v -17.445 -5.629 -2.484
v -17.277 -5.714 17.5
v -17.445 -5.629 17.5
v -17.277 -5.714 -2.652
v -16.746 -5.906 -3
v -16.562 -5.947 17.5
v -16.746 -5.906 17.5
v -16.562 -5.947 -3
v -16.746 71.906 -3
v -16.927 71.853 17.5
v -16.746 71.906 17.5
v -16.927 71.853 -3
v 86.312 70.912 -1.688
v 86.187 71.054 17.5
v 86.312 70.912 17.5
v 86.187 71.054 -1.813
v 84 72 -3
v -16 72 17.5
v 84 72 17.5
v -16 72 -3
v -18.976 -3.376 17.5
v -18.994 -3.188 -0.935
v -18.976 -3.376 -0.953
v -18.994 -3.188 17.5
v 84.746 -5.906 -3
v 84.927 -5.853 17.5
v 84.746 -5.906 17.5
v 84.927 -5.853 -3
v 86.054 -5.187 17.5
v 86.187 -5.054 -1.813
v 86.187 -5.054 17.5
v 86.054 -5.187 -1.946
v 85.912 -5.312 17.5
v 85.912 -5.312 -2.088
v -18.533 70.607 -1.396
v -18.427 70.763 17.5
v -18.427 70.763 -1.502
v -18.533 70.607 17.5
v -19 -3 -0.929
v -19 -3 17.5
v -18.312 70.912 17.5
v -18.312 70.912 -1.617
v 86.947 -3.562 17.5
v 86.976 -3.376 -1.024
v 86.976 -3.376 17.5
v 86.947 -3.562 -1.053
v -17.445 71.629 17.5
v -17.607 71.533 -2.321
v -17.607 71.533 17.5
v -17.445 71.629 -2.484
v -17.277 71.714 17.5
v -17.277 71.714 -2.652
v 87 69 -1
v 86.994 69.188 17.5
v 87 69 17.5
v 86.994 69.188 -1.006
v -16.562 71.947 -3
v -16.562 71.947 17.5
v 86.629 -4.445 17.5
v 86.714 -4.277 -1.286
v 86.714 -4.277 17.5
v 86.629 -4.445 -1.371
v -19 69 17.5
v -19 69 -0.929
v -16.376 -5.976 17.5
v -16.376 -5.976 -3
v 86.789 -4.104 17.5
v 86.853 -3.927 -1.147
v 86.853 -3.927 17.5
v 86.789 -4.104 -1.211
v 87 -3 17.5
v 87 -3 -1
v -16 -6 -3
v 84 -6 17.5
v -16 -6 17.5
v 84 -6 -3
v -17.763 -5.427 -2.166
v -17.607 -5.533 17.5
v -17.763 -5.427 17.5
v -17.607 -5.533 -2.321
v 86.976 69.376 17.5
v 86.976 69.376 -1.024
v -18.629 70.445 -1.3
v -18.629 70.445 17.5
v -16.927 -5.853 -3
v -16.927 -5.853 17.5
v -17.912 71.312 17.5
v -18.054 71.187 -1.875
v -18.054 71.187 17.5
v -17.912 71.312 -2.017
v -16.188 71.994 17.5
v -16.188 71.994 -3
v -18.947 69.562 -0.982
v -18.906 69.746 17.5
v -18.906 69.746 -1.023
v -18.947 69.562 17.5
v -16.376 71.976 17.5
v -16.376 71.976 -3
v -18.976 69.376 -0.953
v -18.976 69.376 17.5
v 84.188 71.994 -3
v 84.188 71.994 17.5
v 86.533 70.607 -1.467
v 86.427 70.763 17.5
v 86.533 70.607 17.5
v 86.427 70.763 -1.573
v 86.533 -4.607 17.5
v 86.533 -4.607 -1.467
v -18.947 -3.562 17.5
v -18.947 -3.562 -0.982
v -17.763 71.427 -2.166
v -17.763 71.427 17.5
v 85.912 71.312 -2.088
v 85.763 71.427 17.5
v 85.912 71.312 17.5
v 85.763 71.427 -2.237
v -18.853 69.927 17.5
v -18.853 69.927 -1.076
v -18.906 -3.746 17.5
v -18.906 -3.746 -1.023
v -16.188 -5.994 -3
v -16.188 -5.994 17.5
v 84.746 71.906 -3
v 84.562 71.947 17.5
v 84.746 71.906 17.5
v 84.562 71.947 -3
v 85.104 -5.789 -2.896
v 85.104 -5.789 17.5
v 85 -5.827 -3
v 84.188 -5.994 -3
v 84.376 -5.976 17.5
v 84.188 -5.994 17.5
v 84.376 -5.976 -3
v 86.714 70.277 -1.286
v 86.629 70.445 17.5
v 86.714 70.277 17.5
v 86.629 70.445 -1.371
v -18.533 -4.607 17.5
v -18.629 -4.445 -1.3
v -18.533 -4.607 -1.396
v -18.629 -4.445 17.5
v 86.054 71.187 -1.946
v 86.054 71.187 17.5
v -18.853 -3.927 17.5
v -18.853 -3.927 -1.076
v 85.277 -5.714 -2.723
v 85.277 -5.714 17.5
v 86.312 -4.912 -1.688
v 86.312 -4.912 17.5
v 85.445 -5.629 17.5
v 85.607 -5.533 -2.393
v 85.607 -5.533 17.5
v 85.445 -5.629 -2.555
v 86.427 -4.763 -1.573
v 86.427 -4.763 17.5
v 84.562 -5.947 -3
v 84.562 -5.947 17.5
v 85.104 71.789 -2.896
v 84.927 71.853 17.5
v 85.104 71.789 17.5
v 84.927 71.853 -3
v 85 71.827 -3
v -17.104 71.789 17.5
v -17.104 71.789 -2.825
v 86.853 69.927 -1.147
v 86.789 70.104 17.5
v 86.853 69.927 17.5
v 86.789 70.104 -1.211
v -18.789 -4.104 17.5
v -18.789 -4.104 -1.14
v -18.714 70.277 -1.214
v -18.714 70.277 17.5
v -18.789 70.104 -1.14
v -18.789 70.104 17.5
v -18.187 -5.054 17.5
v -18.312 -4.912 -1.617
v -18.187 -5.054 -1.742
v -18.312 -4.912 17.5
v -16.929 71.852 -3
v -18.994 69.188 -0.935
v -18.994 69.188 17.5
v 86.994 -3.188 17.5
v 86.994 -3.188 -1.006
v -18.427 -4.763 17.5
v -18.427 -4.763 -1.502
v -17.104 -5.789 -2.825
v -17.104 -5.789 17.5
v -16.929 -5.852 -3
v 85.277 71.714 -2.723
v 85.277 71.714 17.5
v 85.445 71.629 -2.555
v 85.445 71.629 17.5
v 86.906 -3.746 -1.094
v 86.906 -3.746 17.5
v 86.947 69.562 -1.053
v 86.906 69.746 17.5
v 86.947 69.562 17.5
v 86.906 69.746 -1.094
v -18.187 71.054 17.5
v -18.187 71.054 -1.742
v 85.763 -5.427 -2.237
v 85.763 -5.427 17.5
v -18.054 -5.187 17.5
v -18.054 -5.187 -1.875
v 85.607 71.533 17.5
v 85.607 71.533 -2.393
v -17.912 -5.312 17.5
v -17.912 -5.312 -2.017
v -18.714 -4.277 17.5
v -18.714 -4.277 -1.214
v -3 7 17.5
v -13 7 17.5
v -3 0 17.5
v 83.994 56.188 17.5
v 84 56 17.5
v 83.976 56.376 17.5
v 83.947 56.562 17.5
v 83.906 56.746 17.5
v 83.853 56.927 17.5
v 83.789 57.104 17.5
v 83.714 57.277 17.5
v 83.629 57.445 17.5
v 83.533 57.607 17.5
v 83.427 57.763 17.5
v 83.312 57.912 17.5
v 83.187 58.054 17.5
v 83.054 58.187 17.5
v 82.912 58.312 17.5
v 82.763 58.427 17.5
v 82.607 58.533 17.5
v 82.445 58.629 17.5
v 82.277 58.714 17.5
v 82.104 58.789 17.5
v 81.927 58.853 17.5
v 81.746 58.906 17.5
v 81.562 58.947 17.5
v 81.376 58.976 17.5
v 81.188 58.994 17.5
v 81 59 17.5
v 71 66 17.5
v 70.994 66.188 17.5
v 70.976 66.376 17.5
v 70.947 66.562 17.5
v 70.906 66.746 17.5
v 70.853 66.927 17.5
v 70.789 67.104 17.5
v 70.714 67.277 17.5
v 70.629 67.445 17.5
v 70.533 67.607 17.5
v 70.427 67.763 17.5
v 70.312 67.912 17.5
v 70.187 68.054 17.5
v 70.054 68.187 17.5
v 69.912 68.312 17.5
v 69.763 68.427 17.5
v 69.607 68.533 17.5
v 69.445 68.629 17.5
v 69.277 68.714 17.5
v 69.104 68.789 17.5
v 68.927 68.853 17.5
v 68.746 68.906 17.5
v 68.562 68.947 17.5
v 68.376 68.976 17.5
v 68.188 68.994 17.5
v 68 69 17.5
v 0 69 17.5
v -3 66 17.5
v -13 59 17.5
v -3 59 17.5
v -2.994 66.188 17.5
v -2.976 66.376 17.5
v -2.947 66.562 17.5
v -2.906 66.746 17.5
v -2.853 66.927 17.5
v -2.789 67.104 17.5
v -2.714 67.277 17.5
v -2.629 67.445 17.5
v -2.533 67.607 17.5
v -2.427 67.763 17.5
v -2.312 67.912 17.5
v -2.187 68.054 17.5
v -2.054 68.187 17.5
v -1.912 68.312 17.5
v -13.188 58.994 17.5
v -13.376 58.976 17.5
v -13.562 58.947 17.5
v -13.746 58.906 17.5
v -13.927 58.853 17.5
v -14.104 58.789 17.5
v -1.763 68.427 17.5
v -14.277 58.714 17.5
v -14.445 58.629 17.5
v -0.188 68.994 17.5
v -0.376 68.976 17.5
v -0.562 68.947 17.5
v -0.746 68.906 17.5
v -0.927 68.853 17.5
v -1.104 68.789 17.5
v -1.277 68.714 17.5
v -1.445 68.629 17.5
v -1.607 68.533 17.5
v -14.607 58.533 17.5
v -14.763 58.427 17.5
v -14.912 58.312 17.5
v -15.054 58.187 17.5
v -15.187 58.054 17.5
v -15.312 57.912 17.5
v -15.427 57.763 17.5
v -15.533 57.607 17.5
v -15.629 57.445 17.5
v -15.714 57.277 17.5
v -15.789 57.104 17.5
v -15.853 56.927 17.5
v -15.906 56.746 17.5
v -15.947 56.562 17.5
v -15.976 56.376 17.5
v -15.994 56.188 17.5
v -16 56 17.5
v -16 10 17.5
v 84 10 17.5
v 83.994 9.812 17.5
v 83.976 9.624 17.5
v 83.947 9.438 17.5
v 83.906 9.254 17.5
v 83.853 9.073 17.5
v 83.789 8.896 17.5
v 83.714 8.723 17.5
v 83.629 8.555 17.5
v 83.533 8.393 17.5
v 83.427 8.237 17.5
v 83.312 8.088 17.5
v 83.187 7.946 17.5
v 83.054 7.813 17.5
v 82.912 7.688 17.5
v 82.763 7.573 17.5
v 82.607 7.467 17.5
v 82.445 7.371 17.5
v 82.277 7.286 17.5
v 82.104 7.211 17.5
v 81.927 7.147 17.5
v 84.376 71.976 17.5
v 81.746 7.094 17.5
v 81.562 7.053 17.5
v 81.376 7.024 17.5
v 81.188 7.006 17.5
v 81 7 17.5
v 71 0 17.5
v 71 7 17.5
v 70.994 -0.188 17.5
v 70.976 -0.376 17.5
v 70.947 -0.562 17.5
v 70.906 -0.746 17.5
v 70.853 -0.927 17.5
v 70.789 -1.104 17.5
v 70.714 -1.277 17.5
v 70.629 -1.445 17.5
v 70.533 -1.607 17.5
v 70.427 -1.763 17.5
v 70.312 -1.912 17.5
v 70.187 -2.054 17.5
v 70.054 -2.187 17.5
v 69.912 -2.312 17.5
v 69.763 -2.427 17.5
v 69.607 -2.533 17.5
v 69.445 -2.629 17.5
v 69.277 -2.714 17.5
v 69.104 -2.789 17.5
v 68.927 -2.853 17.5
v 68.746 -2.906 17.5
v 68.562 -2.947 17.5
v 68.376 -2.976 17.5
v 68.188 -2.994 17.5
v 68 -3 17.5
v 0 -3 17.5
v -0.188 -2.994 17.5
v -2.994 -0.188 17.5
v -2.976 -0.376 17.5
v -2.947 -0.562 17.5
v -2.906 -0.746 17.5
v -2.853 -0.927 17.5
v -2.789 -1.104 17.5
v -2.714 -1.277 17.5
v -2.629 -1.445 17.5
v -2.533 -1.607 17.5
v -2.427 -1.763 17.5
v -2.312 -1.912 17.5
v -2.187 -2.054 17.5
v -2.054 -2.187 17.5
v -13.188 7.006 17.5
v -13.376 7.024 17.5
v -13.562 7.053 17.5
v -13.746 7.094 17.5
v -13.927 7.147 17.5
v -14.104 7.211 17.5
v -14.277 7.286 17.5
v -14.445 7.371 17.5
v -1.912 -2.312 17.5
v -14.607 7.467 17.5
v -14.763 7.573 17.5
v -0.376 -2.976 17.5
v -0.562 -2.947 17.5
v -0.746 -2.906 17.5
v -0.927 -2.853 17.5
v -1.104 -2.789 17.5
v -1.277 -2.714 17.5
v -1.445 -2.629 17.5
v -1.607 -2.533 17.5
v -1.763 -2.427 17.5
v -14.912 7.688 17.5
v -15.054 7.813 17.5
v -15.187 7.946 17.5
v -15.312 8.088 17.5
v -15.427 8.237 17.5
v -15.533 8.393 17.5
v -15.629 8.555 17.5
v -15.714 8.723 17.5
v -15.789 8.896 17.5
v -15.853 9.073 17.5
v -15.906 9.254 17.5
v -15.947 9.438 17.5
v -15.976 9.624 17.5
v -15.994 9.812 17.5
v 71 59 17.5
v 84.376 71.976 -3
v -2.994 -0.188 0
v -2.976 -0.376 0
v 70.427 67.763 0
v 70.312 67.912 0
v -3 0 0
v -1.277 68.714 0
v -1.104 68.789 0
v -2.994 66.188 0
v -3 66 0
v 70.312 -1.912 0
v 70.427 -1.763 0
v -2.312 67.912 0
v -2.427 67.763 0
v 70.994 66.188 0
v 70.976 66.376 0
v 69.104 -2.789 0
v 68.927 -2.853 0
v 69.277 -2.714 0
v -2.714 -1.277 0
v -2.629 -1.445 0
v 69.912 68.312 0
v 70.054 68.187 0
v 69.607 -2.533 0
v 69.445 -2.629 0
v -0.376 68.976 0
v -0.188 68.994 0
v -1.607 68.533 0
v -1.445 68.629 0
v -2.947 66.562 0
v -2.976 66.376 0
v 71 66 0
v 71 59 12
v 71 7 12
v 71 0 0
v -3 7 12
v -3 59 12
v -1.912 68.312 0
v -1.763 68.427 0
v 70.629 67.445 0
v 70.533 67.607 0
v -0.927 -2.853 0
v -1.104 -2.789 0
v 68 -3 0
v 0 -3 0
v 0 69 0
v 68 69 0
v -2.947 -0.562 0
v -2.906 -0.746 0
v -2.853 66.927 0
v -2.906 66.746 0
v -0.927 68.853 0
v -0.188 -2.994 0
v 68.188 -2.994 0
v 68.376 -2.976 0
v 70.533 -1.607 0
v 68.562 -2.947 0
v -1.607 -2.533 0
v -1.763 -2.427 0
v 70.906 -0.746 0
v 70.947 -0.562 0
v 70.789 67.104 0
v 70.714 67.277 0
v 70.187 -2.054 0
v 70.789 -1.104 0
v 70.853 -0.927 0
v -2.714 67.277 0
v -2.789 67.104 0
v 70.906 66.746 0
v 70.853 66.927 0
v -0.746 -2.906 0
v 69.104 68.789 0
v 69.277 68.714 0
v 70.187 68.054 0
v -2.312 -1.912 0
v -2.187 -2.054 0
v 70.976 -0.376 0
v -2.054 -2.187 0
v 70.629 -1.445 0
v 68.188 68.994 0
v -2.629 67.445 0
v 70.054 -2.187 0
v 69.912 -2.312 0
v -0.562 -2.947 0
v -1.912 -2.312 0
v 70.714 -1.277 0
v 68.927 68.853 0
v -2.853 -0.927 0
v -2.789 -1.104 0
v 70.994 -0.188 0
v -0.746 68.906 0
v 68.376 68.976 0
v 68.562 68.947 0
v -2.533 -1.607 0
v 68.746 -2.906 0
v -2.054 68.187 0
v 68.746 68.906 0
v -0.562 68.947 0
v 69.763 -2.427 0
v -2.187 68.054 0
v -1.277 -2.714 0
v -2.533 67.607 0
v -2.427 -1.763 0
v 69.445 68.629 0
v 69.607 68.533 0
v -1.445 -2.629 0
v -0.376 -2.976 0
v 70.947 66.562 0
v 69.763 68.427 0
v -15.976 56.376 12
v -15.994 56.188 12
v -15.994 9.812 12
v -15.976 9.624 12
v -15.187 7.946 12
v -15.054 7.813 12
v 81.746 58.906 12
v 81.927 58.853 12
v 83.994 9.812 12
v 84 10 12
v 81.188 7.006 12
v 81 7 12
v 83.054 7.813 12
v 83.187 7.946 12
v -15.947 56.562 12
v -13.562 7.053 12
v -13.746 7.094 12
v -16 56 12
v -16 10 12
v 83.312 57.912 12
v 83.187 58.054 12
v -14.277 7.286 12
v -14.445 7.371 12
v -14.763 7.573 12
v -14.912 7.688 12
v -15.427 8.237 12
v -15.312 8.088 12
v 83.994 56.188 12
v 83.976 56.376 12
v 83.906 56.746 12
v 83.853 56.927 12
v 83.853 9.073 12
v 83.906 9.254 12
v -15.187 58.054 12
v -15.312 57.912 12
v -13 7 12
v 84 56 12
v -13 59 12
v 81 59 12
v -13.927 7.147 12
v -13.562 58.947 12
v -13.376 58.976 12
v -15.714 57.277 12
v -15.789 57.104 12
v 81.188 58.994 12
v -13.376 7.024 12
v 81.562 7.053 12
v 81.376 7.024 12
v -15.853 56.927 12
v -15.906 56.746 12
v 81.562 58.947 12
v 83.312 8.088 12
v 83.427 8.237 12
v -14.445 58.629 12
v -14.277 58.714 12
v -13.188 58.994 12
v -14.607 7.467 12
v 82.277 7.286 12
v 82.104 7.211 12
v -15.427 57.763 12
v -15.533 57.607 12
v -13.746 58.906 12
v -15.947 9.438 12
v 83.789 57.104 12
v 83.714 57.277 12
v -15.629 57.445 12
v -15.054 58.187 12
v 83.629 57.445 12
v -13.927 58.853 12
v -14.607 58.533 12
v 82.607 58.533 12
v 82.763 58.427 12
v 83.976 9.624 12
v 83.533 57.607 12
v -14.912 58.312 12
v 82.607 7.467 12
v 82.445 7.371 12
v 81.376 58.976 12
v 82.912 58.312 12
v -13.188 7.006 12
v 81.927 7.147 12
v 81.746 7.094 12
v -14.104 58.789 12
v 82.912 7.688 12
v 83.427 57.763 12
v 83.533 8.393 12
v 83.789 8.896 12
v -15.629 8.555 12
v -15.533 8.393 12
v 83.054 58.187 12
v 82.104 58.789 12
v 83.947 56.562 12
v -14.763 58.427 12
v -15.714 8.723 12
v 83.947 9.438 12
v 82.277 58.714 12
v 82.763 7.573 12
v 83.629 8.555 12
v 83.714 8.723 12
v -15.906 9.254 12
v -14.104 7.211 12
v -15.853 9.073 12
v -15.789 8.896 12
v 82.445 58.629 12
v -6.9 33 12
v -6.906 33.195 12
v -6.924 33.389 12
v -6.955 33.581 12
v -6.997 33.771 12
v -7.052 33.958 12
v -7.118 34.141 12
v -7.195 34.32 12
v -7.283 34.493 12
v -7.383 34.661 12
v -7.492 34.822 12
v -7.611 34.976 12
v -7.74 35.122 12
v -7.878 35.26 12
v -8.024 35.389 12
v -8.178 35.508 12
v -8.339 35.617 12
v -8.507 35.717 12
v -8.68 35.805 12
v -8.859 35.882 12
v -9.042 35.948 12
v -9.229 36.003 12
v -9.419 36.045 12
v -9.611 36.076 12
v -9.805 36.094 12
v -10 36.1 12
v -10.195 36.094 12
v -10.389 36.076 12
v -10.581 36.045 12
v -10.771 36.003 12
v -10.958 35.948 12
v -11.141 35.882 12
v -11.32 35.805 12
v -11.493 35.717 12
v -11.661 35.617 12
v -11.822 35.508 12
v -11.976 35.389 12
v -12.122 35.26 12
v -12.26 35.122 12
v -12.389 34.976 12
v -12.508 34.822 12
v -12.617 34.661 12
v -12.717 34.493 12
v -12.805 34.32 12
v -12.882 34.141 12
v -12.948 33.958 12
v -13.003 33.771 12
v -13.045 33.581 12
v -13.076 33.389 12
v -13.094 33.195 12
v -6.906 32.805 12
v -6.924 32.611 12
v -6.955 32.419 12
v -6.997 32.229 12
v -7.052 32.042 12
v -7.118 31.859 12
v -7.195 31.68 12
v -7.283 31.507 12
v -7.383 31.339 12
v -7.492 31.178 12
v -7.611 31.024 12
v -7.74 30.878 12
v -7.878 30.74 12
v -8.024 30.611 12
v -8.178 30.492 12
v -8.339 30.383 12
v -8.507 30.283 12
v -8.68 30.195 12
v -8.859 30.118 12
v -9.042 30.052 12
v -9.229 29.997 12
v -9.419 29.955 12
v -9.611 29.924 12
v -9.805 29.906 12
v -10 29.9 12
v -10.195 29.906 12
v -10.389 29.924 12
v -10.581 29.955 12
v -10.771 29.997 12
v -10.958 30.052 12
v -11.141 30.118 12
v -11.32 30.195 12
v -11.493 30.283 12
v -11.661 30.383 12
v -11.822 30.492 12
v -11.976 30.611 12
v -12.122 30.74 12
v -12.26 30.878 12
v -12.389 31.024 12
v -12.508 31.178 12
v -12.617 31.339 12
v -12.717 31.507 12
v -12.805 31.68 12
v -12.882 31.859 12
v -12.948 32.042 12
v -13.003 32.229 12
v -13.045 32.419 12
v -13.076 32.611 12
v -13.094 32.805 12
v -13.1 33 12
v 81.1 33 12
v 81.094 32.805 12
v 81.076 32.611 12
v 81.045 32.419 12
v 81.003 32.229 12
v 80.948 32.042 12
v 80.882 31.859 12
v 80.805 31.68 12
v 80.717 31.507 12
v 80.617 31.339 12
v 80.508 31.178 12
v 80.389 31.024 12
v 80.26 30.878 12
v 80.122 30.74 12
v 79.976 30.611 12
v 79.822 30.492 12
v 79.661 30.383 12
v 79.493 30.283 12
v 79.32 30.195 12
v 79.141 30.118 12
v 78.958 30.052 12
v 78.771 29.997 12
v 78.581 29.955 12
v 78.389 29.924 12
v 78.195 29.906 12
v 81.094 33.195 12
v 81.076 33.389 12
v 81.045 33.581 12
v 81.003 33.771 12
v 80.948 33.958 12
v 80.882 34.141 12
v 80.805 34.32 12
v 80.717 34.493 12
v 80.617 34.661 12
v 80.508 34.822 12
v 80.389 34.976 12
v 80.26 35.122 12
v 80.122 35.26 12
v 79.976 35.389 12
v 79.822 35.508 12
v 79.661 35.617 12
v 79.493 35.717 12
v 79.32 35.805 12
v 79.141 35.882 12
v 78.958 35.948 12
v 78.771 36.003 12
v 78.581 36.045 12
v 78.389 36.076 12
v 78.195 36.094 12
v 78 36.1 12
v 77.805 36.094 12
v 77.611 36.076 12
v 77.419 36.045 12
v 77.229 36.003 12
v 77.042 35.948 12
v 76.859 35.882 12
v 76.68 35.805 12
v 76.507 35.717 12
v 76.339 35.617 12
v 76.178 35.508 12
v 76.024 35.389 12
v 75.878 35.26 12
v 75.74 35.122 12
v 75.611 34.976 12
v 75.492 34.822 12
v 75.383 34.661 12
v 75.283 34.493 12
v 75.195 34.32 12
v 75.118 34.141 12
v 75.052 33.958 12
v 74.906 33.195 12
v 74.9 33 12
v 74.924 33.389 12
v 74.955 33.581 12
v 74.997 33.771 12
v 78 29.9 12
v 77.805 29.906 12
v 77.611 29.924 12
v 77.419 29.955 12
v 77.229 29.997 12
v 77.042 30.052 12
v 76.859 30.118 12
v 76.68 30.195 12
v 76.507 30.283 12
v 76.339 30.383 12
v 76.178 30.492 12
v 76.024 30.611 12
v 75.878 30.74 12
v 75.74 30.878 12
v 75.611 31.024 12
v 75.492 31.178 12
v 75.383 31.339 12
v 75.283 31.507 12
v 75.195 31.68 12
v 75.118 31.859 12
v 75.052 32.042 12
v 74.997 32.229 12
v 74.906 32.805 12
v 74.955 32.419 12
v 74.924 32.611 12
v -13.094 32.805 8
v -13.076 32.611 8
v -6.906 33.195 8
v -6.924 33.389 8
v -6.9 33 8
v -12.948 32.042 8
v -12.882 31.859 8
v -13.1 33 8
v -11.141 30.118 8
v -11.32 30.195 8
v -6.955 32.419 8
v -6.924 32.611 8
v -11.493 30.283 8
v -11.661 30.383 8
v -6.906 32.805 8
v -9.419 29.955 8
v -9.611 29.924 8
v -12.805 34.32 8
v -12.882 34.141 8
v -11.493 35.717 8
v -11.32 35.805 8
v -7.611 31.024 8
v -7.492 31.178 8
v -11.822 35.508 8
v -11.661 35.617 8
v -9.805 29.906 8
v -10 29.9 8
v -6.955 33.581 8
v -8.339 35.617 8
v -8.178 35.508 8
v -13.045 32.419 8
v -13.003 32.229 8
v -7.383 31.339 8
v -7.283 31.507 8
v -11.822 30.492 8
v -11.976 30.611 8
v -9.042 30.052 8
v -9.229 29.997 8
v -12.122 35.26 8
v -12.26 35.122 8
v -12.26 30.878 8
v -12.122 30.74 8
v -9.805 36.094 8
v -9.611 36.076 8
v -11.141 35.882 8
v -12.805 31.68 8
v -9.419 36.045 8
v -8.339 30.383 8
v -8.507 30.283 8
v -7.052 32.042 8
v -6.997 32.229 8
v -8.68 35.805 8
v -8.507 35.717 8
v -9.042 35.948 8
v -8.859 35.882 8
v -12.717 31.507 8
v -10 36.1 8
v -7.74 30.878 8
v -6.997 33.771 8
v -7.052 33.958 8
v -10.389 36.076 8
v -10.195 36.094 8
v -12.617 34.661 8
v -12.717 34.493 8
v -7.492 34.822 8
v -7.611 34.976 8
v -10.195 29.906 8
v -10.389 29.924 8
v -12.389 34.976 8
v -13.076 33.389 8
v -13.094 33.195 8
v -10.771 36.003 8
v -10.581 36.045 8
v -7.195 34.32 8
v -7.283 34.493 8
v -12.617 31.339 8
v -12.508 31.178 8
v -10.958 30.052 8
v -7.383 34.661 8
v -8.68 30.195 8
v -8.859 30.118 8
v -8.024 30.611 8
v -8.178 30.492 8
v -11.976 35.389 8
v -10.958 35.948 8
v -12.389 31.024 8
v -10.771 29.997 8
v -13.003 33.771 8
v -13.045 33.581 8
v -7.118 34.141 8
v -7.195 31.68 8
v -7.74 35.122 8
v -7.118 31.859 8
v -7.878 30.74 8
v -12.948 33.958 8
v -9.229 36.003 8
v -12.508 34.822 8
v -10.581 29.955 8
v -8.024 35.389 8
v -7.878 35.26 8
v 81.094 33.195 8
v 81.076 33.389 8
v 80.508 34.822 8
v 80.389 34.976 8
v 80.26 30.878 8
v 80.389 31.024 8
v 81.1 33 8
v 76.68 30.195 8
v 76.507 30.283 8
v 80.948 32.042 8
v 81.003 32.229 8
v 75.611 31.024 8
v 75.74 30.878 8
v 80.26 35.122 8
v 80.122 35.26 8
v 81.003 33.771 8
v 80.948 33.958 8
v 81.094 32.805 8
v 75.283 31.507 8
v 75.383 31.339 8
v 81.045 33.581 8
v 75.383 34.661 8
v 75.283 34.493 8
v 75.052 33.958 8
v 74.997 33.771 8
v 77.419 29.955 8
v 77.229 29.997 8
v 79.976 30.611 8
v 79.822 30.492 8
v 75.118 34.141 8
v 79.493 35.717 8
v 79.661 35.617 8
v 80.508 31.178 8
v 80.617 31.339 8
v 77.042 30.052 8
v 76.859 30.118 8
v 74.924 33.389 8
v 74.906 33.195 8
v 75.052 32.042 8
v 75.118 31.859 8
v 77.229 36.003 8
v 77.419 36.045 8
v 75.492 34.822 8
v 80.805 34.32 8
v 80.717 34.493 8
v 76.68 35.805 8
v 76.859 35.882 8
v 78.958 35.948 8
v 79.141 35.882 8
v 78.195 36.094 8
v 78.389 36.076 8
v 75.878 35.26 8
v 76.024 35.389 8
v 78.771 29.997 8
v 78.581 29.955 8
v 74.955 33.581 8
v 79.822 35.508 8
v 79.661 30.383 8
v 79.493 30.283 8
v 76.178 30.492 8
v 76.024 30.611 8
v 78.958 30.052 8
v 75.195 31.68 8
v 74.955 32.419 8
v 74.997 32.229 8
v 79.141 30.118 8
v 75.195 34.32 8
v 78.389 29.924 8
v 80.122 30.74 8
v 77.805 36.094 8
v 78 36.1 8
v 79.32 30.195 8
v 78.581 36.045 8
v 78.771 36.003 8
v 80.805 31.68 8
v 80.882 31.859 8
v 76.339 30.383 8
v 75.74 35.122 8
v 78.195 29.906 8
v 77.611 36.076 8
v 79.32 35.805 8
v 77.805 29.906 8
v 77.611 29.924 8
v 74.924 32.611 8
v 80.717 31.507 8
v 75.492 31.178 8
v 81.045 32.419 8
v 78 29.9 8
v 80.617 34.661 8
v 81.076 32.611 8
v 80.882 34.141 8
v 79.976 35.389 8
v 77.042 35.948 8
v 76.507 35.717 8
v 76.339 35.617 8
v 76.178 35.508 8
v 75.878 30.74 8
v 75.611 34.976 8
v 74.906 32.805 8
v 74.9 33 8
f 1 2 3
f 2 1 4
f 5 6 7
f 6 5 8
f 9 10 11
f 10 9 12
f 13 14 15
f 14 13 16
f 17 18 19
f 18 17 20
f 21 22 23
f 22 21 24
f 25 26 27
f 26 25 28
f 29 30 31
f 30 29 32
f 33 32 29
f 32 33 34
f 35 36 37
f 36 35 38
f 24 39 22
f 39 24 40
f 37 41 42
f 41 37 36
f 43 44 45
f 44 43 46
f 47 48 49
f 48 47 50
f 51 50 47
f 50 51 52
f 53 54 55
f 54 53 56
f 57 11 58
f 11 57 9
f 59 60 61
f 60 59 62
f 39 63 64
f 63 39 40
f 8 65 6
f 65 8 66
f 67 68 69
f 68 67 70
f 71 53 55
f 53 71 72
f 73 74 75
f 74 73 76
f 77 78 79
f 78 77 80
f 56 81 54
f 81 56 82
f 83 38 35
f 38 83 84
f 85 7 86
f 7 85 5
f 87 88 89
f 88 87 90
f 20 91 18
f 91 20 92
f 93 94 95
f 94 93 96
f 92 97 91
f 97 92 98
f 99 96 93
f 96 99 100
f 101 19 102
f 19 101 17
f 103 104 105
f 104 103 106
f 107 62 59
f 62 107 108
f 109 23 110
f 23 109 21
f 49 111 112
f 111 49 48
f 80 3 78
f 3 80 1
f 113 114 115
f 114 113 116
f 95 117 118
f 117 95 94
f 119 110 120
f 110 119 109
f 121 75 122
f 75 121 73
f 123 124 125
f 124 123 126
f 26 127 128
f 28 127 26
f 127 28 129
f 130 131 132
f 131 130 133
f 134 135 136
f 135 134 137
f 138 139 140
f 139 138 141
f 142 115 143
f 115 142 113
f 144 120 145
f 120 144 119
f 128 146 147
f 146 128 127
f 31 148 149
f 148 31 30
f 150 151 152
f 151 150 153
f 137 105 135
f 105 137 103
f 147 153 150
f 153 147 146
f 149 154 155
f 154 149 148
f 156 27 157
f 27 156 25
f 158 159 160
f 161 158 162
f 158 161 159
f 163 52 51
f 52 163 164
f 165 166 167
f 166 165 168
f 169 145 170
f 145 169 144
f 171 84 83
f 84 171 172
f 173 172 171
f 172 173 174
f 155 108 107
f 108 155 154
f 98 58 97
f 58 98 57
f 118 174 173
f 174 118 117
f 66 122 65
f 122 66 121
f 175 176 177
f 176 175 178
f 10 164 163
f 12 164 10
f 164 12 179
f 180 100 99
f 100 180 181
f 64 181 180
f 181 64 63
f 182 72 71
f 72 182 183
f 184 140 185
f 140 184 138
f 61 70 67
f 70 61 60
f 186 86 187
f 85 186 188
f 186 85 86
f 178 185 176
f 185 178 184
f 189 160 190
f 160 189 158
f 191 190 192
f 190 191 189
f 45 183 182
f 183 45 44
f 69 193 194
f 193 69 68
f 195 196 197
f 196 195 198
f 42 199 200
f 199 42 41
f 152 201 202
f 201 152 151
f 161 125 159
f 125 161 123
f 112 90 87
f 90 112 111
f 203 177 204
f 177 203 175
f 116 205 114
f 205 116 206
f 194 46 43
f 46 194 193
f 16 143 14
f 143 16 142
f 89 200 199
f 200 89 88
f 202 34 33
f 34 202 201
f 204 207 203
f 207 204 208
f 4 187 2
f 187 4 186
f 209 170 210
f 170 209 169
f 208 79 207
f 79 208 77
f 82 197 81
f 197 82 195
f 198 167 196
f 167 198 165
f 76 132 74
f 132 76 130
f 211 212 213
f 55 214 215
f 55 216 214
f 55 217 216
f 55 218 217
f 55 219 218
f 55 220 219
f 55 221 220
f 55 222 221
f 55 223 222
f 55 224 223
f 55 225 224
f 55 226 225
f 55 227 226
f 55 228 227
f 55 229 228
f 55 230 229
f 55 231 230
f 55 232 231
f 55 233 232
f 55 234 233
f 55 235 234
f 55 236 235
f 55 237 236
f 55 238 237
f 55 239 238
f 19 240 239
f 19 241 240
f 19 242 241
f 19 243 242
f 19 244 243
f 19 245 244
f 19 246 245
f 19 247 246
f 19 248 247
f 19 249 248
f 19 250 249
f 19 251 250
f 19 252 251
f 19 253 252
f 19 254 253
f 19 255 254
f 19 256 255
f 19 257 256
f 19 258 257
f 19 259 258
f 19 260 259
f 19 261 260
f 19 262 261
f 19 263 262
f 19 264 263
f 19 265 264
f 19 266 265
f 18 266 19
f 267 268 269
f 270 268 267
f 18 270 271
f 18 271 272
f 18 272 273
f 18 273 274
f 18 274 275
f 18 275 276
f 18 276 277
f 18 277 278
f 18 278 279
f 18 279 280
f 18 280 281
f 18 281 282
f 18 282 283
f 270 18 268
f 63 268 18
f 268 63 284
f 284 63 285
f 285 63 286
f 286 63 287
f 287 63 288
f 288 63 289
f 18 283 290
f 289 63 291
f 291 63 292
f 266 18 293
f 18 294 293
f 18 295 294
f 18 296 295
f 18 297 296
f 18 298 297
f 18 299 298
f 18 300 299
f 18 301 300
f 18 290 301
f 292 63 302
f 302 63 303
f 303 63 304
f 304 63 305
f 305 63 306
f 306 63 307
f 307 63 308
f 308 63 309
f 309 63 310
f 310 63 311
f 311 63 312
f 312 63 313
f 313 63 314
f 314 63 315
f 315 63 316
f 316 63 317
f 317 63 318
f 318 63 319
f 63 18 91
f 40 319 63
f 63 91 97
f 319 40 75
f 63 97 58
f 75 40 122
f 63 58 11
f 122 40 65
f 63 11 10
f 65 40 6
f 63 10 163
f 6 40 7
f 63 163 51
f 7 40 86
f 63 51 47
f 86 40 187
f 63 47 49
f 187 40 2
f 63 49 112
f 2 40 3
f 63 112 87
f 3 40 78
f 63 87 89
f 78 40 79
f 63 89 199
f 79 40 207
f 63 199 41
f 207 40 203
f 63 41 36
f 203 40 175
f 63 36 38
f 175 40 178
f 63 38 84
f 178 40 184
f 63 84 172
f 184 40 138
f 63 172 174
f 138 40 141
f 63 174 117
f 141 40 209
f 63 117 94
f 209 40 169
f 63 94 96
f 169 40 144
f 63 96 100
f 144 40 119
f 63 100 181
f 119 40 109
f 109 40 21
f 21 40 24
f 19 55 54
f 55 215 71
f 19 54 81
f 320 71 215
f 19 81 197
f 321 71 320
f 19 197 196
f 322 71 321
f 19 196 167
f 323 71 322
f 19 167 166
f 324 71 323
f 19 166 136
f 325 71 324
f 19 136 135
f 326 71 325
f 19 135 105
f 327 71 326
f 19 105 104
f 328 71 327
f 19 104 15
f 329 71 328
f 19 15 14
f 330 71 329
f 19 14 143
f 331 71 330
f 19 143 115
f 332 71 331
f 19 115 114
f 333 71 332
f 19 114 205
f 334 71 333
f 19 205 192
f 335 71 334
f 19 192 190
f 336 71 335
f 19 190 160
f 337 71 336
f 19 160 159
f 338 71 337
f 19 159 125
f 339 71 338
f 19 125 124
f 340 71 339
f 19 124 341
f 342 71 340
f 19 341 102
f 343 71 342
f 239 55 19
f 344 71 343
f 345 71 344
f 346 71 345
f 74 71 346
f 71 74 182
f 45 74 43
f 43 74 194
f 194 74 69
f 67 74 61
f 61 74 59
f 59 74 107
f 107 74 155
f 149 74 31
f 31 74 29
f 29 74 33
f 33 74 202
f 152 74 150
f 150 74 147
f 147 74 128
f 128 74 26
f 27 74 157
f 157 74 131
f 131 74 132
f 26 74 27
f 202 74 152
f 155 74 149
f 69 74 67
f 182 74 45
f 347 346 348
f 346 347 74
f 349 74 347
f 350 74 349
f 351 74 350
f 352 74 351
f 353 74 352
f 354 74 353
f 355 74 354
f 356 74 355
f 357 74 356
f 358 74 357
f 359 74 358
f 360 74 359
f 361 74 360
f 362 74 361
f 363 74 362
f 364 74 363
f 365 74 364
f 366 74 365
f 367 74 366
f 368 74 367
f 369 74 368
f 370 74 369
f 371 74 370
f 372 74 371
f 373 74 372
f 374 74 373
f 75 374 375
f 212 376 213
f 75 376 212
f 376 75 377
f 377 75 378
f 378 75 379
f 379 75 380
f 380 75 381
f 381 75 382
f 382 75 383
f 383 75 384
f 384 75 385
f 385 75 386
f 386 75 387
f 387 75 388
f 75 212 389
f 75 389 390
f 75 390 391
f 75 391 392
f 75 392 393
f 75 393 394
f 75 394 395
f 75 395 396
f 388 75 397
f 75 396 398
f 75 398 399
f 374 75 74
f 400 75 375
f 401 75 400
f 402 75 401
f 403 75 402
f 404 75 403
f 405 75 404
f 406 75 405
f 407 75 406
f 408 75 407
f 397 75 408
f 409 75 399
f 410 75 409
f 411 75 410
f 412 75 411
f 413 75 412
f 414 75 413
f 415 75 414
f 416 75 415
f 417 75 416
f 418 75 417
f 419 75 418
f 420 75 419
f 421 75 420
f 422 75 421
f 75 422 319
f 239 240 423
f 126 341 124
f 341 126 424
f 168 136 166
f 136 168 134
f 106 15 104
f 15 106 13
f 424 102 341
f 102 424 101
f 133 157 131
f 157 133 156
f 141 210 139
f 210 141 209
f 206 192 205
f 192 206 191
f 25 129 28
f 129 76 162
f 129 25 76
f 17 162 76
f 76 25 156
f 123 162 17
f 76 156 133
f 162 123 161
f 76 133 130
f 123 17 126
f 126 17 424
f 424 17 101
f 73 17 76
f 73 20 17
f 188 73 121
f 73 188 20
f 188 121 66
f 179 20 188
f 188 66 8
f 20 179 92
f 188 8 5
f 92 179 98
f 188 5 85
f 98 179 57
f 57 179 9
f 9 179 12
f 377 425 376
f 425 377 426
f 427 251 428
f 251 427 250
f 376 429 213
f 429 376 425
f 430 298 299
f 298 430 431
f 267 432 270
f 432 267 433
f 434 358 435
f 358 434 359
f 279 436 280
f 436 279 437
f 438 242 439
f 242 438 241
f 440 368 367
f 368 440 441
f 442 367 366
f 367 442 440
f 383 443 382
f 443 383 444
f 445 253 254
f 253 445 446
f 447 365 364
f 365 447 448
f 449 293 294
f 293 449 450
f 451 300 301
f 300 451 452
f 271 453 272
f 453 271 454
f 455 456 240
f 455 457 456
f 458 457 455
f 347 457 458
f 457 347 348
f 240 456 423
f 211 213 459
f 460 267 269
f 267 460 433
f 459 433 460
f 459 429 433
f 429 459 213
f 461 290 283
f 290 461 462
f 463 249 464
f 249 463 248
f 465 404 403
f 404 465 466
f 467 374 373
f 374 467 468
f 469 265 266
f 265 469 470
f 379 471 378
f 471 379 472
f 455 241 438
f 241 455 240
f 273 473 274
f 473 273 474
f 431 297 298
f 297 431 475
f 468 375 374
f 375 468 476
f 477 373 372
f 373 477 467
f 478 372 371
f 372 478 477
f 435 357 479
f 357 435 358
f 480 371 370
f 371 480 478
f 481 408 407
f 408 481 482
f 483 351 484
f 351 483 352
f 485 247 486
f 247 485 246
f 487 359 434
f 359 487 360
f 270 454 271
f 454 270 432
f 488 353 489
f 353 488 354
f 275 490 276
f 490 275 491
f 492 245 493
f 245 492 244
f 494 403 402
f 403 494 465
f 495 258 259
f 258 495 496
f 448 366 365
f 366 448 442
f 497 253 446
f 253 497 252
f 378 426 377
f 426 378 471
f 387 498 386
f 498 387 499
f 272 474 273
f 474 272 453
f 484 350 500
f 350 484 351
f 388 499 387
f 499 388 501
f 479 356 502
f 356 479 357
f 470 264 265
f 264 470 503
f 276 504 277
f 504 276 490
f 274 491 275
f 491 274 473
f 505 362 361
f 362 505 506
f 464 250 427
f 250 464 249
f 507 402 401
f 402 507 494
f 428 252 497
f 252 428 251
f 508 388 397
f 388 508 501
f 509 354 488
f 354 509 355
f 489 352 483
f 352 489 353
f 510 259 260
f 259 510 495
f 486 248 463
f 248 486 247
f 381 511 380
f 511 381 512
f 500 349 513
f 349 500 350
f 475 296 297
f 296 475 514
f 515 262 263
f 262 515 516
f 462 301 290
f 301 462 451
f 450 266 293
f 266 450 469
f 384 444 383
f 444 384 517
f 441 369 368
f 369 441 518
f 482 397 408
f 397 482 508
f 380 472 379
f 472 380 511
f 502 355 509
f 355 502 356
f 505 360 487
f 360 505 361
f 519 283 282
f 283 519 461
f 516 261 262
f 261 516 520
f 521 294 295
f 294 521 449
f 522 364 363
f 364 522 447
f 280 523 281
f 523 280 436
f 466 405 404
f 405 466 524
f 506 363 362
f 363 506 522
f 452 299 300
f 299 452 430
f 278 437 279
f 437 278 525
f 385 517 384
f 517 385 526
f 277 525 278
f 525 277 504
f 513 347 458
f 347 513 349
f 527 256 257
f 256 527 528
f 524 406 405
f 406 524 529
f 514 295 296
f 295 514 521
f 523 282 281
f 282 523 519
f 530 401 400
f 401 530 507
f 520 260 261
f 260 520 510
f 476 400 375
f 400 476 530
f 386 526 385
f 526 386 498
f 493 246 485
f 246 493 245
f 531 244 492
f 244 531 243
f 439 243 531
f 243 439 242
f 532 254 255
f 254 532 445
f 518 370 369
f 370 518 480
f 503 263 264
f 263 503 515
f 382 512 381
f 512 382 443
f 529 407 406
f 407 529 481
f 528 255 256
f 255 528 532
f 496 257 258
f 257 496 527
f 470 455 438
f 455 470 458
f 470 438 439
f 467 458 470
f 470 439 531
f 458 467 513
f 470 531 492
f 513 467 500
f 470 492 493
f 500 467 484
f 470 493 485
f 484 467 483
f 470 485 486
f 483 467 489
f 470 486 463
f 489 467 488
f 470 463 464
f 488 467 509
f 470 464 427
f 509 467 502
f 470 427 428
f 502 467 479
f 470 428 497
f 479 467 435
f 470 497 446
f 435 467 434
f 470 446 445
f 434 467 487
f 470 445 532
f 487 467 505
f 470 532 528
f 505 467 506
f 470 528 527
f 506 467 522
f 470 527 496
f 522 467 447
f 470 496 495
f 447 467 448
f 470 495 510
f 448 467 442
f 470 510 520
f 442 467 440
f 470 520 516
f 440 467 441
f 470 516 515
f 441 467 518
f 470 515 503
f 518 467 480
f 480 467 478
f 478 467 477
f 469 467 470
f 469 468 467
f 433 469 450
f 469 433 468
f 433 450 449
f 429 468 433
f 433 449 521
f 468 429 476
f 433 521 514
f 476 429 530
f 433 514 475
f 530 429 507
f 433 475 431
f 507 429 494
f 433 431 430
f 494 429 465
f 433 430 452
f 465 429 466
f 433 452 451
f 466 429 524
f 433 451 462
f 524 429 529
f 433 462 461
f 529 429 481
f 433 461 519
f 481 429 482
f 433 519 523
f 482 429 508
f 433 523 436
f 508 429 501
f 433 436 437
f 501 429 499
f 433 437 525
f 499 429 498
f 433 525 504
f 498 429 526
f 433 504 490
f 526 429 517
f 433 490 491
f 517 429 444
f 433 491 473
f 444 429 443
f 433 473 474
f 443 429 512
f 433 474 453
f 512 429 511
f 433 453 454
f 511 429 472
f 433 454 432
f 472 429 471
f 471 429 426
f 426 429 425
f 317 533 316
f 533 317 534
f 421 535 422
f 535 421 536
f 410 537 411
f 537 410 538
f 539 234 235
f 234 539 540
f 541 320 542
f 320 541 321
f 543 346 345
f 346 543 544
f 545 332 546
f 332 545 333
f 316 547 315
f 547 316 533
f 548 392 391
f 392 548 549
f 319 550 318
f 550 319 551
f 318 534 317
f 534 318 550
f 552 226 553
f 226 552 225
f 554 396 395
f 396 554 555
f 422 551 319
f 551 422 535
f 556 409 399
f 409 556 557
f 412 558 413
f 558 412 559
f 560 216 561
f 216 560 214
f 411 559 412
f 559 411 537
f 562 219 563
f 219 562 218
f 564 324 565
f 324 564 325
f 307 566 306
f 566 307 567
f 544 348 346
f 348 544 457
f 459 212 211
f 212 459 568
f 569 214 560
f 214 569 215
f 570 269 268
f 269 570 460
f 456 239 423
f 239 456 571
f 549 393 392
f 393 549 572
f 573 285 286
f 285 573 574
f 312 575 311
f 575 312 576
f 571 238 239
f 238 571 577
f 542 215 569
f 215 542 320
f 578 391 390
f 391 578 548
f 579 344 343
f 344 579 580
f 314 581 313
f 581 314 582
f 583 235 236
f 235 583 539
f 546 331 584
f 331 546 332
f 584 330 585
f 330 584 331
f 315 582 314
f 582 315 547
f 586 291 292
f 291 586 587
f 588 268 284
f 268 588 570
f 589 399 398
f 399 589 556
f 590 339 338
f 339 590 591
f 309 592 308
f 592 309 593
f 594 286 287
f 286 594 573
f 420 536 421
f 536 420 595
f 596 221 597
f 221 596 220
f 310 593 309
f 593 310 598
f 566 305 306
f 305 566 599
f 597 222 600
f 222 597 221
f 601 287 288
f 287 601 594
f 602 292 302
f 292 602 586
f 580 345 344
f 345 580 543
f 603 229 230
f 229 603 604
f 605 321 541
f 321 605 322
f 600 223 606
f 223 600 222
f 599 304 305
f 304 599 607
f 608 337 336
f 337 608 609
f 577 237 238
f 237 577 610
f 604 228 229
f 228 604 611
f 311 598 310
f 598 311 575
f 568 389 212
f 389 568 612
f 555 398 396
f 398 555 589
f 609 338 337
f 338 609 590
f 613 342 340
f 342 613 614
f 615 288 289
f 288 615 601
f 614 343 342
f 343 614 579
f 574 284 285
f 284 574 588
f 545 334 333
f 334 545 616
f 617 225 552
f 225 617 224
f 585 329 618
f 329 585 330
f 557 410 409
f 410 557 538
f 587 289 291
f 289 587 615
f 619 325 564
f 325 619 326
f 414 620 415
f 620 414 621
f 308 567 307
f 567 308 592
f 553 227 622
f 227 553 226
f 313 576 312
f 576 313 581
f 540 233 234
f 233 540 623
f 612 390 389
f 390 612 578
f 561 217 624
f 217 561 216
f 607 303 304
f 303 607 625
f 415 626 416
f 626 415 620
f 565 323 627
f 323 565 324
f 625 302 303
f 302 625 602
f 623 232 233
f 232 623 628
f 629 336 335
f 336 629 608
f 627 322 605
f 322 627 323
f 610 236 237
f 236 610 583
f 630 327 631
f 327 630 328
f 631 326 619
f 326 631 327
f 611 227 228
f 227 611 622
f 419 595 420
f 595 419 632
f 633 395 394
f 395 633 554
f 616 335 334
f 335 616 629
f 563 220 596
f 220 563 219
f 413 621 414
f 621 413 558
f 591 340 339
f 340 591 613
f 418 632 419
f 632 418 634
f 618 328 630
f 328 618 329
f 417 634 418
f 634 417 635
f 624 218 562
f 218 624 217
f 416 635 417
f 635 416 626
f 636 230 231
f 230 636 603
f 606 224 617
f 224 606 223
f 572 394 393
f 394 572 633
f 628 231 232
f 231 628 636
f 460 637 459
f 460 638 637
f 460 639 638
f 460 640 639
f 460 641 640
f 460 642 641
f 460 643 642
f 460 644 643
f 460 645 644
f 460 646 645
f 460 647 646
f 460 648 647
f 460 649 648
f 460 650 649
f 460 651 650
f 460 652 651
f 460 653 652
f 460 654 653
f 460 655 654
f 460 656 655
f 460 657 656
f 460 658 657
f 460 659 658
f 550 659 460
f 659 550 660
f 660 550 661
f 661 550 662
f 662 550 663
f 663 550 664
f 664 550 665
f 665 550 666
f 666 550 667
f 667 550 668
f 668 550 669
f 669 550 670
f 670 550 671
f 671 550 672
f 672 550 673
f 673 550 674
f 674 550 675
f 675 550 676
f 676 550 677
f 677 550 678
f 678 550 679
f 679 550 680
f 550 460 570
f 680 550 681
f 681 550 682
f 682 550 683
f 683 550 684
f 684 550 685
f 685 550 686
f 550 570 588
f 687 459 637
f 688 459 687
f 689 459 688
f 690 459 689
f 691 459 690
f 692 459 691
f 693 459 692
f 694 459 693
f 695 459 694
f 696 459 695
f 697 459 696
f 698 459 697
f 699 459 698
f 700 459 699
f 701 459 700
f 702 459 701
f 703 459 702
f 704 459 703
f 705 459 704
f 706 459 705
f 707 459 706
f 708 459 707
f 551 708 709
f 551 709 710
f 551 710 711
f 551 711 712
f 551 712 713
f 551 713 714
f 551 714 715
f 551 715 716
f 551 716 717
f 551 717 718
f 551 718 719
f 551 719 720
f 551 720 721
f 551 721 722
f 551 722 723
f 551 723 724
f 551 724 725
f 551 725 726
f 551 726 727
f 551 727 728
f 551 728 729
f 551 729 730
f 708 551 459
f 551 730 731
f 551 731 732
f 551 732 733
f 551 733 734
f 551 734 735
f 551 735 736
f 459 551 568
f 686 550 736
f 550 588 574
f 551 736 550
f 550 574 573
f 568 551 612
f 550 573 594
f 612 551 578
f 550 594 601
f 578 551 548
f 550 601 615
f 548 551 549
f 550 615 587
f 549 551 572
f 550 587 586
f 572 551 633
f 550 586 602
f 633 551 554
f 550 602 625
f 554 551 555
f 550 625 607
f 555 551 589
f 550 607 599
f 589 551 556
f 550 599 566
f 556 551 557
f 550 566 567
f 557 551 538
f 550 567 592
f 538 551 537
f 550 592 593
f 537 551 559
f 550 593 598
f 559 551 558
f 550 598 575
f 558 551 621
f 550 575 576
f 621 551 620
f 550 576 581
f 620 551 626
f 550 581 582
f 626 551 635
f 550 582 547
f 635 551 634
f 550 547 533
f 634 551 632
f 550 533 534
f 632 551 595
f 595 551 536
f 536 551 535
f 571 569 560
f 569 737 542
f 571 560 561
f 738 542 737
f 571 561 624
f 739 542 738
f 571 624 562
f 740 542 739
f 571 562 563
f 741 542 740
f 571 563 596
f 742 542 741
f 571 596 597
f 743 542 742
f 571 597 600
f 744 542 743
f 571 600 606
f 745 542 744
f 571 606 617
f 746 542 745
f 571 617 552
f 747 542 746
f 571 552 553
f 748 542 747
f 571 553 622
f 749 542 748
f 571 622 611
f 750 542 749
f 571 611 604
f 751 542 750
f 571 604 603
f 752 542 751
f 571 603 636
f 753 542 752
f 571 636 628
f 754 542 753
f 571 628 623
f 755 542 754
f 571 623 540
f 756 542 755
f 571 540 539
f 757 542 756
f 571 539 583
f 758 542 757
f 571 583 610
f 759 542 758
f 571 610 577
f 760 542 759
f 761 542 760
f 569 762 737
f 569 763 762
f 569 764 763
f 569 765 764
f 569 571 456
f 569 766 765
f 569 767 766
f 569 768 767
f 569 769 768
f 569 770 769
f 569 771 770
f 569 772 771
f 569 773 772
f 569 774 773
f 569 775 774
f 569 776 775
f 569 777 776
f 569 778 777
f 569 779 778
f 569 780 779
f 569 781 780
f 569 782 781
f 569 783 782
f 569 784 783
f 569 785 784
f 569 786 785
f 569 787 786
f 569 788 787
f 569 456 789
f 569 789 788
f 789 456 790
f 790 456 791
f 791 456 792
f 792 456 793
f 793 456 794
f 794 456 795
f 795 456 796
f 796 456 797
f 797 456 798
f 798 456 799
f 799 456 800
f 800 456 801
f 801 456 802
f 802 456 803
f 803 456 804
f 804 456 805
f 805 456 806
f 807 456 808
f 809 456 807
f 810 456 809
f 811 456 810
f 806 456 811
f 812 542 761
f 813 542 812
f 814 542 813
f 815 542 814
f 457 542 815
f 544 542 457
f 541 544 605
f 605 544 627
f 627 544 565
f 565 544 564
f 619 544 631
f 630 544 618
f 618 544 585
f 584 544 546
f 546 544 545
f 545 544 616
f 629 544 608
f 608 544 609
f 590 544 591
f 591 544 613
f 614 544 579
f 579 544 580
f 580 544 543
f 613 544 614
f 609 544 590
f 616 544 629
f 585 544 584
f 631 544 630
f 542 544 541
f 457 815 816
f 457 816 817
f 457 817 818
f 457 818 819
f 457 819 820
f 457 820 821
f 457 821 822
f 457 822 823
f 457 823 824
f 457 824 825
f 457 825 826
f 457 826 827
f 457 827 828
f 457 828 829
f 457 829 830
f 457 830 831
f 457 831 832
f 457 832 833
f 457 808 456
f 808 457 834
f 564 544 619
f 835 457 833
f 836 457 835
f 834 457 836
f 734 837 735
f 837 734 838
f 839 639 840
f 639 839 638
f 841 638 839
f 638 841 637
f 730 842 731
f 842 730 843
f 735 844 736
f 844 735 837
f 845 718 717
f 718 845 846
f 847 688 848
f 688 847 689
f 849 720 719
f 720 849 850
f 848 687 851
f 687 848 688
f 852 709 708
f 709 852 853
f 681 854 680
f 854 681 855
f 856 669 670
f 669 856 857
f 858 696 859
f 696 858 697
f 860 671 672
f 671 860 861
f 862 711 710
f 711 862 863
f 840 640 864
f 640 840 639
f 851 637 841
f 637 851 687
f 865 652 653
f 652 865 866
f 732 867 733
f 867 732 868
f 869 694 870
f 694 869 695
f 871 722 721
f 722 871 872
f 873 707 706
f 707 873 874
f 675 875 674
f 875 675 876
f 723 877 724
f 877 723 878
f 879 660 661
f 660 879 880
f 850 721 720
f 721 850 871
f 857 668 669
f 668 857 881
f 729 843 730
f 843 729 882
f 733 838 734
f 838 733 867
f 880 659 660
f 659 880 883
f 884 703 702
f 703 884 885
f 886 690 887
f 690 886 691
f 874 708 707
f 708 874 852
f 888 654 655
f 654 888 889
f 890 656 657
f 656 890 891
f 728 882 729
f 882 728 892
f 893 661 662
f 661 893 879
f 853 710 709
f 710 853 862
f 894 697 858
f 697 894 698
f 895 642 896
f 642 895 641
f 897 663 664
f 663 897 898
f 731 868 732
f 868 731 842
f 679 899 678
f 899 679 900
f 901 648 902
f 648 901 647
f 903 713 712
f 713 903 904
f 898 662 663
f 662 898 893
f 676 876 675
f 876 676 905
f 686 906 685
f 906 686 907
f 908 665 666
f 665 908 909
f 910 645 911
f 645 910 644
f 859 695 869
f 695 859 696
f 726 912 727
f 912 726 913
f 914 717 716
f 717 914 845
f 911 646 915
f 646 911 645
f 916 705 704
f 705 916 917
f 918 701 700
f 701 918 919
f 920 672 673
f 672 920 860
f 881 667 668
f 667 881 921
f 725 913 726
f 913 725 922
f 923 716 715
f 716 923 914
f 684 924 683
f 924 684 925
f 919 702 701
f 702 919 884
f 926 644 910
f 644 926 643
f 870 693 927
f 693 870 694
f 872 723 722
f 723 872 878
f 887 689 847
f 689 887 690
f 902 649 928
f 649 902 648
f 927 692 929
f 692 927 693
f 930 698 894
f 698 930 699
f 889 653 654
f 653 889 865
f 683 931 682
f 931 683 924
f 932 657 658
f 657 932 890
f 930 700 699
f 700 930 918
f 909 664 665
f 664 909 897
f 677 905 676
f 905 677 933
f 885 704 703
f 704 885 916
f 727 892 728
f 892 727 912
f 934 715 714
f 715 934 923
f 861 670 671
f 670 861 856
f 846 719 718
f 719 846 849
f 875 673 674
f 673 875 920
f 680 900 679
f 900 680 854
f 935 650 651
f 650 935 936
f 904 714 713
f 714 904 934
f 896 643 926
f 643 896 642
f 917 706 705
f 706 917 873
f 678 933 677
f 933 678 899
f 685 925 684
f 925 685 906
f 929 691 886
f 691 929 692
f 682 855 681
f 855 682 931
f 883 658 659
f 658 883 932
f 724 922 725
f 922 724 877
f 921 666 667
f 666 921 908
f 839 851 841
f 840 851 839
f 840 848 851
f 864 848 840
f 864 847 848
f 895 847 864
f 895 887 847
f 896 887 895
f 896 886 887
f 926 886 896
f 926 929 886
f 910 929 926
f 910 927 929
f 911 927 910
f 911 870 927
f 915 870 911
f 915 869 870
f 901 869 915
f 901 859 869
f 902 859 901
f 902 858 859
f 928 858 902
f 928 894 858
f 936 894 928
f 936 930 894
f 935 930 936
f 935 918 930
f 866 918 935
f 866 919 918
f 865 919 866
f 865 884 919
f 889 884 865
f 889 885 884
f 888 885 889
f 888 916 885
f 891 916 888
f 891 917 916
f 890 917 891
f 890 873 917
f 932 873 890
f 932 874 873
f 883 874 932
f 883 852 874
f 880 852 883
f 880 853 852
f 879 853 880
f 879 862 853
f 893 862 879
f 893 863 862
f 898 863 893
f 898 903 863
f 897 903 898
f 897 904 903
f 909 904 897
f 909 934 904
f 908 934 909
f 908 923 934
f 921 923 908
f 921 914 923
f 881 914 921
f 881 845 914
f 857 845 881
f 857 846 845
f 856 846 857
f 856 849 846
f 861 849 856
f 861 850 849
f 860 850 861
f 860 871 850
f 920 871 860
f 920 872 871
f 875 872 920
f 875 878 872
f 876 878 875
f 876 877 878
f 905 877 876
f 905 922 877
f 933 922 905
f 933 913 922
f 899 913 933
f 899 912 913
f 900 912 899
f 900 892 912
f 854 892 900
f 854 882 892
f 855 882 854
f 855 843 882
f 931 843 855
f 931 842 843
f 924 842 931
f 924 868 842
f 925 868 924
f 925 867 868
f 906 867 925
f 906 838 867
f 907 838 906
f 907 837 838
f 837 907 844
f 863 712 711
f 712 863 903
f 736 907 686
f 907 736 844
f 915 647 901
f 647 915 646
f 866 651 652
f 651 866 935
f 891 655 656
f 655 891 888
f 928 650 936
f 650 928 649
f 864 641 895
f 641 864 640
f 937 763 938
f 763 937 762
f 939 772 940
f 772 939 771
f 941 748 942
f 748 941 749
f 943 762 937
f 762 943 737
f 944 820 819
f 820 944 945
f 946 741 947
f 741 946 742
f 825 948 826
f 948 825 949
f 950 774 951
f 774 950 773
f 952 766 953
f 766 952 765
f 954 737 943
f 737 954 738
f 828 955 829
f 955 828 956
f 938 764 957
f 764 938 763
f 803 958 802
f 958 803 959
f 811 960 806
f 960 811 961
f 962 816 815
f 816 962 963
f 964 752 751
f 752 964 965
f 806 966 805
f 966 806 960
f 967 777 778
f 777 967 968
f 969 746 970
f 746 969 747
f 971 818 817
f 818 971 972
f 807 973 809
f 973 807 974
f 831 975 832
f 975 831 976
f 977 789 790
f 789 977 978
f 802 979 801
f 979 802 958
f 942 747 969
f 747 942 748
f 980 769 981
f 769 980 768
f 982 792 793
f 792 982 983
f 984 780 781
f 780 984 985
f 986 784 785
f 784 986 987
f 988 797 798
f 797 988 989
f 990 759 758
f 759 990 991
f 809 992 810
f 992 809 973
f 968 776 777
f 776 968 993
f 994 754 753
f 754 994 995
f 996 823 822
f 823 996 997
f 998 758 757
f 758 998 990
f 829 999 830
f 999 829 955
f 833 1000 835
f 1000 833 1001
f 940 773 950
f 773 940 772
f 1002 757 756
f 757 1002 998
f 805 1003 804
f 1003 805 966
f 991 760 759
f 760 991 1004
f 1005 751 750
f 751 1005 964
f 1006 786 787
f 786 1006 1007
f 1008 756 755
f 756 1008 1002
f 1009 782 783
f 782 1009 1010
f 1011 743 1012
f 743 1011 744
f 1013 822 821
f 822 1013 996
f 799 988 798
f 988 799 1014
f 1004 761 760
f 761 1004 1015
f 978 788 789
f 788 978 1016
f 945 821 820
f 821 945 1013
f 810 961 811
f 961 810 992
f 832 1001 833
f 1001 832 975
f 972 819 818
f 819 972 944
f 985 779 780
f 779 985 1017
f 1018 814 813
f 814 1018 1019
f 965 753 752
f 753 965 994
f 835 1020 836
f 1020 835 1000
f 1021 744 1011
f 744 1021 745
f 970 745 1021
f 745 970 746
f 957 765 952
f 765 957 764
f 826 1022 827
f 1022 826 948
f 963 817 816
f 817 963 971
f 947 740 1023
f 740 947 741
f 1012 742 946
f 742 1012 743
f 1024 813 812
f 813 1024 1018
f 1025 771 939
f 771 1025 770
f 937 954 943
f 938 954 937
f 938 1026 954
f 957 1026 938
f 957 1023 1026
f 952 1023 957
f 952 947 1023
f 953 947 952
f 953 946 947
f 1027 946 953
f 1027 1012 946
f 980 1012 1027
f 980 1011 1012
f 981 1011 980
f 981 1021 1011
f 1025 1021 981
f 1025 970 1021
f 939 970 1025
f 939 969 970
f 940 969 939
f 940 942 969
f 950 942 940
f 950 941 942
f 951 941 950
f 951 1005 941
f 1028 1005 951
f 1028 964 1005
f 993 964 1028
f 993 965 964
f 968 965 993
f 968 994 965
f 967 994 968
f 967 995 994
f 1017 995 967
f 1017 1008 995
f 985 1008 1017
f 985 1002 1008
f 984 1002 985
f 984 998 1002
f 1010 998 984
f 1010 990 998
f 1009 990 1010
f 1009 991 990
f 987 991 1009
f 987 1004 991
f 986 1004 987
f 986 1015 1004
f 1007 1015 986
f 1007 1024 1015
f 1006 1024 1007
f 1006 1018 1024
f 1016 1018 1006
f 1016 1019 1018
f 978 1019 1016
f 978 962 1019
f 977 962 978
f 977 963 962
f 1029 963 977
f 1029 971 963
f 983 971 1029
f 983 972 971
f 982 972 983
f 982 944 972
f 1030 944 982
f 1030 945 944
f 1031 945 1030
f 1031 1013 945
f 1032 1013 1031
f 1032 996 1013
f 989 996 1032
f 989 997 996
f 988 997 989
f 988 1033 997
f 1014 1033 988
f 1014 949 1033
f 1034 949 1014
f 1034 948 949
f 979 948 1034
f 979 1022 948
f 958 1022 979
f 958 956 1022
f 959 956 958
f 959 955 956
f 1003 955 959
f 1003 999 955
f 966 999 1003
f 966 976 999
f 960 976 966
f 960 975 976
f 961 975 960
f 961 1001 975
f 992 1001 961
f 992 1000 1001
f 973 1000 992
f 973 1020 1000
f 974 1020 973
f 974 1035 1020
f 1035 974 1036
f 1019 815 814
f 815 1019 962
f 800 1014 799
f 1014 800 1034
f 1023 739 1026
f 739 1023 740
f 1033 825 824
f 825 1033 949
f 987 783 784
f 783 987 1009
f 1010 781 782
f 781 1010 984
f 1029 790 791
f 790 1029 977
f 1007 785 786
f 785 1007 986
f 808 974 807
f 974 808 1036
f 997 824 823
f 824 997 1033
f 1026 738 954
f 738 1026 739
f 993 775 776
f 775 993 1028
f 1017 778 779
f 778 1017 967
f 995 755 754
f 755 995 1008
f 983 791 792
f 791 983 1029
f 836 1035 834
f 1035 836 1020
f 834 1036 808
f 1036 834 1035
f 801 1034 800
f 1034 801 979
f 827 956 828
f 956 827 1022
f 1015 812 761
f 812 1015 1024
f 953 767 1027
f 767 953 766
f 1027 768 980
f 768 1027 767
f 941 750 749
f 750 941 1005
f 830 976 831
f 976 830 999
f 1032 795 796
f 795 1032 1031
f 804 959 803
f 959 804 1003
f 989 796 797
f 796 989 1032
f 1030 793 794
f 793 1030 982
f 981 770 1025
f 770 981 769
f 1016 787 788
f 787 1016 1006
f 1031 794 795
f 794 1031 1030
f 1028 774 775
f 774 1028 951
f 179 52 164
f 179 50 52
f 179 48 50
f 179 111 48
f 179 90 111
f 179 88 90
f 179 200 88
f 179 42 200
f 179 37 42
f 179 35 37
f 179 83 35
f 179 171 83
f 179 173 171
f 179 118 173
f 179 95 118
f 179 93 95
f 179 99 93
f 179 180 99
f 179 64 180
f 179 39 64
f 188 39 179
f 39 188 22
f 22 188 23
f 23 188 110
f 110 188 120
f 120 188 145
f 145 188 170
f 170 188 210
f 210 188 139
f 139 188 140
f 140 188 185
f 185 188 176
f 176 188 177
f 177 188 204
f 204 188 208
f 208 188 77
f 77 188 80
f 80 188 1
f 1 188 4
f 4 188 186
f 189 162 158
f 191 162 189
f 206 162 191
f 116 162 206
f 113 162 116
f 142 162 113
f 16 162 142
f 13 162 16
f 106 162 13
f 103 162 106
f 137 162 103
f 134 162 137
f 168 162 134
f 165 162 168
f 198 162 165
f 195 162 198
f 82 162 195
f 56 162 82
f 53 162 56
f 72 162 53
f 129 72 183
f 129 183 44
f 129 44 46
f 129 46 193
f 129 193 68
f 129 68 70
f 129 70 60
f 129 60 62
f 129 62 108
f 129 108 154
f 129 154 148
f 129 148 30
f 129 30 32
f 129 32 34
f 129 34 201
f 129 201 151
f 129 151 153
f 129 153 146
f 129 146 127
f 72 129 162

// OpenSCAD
difference() {
    translate([-16,-3,-3]) linear_extrude(20.5) hull() {
        circle(3,$fn=100);
        translate([100,0,0]) circle(3,$fn=100);
        translate([0,72,0]) circle(3,$fn=100);
        translate([100,72,0]) circle(3,$fn=100);
    }
    //usb memories
    /*
    translate([0,-2,0]) union() {
        linear_extrude(12) square([22,70]);
        translate([23,0,0]) linear_extrude(12) square([22,70]);
        translate([46,0,0]) linear_extrude(12) square([22,70]);
    }
    */

    linear_extrude(18) hull() {
        circle(3,$fn=100);
        translate([68,0,0]) circle(3,$fn=100);
        translate([0,66,0]) circle(3,$fn=100);
        translate([68,66,0]) circle(3,$fn=100);
    }
    //lid( 実際は 5 mm厚 )
    translate([-13,0,12]) linear_extrude(7) hull() {
        translate([0,10,0]) circle(3,$fn=100);
        translate([94,10,0]) circle(3,$fn=100);
        translate([0,56,0]) circle(3,$fn=100);
        translate([94,56,0]) circle(3,$fn=100);
    }
    //磁石
    translate([-10,33,8]) linear_extrude(4) circle(3.1,$fn=100);
    translate([78,33,8]) linear_extrude(4) circle(3.1,$fn=100);
    //剥し
    translate([-23,85,-4]) rotate([0,45,0]) rotate([90,0,0]) linear_extrude(100) square([5,5]);
    translate([84,85,-4]) rotate([0,45,0]) rotate([90,0,0]) linear_extrude(100) square([5,5]);
}
